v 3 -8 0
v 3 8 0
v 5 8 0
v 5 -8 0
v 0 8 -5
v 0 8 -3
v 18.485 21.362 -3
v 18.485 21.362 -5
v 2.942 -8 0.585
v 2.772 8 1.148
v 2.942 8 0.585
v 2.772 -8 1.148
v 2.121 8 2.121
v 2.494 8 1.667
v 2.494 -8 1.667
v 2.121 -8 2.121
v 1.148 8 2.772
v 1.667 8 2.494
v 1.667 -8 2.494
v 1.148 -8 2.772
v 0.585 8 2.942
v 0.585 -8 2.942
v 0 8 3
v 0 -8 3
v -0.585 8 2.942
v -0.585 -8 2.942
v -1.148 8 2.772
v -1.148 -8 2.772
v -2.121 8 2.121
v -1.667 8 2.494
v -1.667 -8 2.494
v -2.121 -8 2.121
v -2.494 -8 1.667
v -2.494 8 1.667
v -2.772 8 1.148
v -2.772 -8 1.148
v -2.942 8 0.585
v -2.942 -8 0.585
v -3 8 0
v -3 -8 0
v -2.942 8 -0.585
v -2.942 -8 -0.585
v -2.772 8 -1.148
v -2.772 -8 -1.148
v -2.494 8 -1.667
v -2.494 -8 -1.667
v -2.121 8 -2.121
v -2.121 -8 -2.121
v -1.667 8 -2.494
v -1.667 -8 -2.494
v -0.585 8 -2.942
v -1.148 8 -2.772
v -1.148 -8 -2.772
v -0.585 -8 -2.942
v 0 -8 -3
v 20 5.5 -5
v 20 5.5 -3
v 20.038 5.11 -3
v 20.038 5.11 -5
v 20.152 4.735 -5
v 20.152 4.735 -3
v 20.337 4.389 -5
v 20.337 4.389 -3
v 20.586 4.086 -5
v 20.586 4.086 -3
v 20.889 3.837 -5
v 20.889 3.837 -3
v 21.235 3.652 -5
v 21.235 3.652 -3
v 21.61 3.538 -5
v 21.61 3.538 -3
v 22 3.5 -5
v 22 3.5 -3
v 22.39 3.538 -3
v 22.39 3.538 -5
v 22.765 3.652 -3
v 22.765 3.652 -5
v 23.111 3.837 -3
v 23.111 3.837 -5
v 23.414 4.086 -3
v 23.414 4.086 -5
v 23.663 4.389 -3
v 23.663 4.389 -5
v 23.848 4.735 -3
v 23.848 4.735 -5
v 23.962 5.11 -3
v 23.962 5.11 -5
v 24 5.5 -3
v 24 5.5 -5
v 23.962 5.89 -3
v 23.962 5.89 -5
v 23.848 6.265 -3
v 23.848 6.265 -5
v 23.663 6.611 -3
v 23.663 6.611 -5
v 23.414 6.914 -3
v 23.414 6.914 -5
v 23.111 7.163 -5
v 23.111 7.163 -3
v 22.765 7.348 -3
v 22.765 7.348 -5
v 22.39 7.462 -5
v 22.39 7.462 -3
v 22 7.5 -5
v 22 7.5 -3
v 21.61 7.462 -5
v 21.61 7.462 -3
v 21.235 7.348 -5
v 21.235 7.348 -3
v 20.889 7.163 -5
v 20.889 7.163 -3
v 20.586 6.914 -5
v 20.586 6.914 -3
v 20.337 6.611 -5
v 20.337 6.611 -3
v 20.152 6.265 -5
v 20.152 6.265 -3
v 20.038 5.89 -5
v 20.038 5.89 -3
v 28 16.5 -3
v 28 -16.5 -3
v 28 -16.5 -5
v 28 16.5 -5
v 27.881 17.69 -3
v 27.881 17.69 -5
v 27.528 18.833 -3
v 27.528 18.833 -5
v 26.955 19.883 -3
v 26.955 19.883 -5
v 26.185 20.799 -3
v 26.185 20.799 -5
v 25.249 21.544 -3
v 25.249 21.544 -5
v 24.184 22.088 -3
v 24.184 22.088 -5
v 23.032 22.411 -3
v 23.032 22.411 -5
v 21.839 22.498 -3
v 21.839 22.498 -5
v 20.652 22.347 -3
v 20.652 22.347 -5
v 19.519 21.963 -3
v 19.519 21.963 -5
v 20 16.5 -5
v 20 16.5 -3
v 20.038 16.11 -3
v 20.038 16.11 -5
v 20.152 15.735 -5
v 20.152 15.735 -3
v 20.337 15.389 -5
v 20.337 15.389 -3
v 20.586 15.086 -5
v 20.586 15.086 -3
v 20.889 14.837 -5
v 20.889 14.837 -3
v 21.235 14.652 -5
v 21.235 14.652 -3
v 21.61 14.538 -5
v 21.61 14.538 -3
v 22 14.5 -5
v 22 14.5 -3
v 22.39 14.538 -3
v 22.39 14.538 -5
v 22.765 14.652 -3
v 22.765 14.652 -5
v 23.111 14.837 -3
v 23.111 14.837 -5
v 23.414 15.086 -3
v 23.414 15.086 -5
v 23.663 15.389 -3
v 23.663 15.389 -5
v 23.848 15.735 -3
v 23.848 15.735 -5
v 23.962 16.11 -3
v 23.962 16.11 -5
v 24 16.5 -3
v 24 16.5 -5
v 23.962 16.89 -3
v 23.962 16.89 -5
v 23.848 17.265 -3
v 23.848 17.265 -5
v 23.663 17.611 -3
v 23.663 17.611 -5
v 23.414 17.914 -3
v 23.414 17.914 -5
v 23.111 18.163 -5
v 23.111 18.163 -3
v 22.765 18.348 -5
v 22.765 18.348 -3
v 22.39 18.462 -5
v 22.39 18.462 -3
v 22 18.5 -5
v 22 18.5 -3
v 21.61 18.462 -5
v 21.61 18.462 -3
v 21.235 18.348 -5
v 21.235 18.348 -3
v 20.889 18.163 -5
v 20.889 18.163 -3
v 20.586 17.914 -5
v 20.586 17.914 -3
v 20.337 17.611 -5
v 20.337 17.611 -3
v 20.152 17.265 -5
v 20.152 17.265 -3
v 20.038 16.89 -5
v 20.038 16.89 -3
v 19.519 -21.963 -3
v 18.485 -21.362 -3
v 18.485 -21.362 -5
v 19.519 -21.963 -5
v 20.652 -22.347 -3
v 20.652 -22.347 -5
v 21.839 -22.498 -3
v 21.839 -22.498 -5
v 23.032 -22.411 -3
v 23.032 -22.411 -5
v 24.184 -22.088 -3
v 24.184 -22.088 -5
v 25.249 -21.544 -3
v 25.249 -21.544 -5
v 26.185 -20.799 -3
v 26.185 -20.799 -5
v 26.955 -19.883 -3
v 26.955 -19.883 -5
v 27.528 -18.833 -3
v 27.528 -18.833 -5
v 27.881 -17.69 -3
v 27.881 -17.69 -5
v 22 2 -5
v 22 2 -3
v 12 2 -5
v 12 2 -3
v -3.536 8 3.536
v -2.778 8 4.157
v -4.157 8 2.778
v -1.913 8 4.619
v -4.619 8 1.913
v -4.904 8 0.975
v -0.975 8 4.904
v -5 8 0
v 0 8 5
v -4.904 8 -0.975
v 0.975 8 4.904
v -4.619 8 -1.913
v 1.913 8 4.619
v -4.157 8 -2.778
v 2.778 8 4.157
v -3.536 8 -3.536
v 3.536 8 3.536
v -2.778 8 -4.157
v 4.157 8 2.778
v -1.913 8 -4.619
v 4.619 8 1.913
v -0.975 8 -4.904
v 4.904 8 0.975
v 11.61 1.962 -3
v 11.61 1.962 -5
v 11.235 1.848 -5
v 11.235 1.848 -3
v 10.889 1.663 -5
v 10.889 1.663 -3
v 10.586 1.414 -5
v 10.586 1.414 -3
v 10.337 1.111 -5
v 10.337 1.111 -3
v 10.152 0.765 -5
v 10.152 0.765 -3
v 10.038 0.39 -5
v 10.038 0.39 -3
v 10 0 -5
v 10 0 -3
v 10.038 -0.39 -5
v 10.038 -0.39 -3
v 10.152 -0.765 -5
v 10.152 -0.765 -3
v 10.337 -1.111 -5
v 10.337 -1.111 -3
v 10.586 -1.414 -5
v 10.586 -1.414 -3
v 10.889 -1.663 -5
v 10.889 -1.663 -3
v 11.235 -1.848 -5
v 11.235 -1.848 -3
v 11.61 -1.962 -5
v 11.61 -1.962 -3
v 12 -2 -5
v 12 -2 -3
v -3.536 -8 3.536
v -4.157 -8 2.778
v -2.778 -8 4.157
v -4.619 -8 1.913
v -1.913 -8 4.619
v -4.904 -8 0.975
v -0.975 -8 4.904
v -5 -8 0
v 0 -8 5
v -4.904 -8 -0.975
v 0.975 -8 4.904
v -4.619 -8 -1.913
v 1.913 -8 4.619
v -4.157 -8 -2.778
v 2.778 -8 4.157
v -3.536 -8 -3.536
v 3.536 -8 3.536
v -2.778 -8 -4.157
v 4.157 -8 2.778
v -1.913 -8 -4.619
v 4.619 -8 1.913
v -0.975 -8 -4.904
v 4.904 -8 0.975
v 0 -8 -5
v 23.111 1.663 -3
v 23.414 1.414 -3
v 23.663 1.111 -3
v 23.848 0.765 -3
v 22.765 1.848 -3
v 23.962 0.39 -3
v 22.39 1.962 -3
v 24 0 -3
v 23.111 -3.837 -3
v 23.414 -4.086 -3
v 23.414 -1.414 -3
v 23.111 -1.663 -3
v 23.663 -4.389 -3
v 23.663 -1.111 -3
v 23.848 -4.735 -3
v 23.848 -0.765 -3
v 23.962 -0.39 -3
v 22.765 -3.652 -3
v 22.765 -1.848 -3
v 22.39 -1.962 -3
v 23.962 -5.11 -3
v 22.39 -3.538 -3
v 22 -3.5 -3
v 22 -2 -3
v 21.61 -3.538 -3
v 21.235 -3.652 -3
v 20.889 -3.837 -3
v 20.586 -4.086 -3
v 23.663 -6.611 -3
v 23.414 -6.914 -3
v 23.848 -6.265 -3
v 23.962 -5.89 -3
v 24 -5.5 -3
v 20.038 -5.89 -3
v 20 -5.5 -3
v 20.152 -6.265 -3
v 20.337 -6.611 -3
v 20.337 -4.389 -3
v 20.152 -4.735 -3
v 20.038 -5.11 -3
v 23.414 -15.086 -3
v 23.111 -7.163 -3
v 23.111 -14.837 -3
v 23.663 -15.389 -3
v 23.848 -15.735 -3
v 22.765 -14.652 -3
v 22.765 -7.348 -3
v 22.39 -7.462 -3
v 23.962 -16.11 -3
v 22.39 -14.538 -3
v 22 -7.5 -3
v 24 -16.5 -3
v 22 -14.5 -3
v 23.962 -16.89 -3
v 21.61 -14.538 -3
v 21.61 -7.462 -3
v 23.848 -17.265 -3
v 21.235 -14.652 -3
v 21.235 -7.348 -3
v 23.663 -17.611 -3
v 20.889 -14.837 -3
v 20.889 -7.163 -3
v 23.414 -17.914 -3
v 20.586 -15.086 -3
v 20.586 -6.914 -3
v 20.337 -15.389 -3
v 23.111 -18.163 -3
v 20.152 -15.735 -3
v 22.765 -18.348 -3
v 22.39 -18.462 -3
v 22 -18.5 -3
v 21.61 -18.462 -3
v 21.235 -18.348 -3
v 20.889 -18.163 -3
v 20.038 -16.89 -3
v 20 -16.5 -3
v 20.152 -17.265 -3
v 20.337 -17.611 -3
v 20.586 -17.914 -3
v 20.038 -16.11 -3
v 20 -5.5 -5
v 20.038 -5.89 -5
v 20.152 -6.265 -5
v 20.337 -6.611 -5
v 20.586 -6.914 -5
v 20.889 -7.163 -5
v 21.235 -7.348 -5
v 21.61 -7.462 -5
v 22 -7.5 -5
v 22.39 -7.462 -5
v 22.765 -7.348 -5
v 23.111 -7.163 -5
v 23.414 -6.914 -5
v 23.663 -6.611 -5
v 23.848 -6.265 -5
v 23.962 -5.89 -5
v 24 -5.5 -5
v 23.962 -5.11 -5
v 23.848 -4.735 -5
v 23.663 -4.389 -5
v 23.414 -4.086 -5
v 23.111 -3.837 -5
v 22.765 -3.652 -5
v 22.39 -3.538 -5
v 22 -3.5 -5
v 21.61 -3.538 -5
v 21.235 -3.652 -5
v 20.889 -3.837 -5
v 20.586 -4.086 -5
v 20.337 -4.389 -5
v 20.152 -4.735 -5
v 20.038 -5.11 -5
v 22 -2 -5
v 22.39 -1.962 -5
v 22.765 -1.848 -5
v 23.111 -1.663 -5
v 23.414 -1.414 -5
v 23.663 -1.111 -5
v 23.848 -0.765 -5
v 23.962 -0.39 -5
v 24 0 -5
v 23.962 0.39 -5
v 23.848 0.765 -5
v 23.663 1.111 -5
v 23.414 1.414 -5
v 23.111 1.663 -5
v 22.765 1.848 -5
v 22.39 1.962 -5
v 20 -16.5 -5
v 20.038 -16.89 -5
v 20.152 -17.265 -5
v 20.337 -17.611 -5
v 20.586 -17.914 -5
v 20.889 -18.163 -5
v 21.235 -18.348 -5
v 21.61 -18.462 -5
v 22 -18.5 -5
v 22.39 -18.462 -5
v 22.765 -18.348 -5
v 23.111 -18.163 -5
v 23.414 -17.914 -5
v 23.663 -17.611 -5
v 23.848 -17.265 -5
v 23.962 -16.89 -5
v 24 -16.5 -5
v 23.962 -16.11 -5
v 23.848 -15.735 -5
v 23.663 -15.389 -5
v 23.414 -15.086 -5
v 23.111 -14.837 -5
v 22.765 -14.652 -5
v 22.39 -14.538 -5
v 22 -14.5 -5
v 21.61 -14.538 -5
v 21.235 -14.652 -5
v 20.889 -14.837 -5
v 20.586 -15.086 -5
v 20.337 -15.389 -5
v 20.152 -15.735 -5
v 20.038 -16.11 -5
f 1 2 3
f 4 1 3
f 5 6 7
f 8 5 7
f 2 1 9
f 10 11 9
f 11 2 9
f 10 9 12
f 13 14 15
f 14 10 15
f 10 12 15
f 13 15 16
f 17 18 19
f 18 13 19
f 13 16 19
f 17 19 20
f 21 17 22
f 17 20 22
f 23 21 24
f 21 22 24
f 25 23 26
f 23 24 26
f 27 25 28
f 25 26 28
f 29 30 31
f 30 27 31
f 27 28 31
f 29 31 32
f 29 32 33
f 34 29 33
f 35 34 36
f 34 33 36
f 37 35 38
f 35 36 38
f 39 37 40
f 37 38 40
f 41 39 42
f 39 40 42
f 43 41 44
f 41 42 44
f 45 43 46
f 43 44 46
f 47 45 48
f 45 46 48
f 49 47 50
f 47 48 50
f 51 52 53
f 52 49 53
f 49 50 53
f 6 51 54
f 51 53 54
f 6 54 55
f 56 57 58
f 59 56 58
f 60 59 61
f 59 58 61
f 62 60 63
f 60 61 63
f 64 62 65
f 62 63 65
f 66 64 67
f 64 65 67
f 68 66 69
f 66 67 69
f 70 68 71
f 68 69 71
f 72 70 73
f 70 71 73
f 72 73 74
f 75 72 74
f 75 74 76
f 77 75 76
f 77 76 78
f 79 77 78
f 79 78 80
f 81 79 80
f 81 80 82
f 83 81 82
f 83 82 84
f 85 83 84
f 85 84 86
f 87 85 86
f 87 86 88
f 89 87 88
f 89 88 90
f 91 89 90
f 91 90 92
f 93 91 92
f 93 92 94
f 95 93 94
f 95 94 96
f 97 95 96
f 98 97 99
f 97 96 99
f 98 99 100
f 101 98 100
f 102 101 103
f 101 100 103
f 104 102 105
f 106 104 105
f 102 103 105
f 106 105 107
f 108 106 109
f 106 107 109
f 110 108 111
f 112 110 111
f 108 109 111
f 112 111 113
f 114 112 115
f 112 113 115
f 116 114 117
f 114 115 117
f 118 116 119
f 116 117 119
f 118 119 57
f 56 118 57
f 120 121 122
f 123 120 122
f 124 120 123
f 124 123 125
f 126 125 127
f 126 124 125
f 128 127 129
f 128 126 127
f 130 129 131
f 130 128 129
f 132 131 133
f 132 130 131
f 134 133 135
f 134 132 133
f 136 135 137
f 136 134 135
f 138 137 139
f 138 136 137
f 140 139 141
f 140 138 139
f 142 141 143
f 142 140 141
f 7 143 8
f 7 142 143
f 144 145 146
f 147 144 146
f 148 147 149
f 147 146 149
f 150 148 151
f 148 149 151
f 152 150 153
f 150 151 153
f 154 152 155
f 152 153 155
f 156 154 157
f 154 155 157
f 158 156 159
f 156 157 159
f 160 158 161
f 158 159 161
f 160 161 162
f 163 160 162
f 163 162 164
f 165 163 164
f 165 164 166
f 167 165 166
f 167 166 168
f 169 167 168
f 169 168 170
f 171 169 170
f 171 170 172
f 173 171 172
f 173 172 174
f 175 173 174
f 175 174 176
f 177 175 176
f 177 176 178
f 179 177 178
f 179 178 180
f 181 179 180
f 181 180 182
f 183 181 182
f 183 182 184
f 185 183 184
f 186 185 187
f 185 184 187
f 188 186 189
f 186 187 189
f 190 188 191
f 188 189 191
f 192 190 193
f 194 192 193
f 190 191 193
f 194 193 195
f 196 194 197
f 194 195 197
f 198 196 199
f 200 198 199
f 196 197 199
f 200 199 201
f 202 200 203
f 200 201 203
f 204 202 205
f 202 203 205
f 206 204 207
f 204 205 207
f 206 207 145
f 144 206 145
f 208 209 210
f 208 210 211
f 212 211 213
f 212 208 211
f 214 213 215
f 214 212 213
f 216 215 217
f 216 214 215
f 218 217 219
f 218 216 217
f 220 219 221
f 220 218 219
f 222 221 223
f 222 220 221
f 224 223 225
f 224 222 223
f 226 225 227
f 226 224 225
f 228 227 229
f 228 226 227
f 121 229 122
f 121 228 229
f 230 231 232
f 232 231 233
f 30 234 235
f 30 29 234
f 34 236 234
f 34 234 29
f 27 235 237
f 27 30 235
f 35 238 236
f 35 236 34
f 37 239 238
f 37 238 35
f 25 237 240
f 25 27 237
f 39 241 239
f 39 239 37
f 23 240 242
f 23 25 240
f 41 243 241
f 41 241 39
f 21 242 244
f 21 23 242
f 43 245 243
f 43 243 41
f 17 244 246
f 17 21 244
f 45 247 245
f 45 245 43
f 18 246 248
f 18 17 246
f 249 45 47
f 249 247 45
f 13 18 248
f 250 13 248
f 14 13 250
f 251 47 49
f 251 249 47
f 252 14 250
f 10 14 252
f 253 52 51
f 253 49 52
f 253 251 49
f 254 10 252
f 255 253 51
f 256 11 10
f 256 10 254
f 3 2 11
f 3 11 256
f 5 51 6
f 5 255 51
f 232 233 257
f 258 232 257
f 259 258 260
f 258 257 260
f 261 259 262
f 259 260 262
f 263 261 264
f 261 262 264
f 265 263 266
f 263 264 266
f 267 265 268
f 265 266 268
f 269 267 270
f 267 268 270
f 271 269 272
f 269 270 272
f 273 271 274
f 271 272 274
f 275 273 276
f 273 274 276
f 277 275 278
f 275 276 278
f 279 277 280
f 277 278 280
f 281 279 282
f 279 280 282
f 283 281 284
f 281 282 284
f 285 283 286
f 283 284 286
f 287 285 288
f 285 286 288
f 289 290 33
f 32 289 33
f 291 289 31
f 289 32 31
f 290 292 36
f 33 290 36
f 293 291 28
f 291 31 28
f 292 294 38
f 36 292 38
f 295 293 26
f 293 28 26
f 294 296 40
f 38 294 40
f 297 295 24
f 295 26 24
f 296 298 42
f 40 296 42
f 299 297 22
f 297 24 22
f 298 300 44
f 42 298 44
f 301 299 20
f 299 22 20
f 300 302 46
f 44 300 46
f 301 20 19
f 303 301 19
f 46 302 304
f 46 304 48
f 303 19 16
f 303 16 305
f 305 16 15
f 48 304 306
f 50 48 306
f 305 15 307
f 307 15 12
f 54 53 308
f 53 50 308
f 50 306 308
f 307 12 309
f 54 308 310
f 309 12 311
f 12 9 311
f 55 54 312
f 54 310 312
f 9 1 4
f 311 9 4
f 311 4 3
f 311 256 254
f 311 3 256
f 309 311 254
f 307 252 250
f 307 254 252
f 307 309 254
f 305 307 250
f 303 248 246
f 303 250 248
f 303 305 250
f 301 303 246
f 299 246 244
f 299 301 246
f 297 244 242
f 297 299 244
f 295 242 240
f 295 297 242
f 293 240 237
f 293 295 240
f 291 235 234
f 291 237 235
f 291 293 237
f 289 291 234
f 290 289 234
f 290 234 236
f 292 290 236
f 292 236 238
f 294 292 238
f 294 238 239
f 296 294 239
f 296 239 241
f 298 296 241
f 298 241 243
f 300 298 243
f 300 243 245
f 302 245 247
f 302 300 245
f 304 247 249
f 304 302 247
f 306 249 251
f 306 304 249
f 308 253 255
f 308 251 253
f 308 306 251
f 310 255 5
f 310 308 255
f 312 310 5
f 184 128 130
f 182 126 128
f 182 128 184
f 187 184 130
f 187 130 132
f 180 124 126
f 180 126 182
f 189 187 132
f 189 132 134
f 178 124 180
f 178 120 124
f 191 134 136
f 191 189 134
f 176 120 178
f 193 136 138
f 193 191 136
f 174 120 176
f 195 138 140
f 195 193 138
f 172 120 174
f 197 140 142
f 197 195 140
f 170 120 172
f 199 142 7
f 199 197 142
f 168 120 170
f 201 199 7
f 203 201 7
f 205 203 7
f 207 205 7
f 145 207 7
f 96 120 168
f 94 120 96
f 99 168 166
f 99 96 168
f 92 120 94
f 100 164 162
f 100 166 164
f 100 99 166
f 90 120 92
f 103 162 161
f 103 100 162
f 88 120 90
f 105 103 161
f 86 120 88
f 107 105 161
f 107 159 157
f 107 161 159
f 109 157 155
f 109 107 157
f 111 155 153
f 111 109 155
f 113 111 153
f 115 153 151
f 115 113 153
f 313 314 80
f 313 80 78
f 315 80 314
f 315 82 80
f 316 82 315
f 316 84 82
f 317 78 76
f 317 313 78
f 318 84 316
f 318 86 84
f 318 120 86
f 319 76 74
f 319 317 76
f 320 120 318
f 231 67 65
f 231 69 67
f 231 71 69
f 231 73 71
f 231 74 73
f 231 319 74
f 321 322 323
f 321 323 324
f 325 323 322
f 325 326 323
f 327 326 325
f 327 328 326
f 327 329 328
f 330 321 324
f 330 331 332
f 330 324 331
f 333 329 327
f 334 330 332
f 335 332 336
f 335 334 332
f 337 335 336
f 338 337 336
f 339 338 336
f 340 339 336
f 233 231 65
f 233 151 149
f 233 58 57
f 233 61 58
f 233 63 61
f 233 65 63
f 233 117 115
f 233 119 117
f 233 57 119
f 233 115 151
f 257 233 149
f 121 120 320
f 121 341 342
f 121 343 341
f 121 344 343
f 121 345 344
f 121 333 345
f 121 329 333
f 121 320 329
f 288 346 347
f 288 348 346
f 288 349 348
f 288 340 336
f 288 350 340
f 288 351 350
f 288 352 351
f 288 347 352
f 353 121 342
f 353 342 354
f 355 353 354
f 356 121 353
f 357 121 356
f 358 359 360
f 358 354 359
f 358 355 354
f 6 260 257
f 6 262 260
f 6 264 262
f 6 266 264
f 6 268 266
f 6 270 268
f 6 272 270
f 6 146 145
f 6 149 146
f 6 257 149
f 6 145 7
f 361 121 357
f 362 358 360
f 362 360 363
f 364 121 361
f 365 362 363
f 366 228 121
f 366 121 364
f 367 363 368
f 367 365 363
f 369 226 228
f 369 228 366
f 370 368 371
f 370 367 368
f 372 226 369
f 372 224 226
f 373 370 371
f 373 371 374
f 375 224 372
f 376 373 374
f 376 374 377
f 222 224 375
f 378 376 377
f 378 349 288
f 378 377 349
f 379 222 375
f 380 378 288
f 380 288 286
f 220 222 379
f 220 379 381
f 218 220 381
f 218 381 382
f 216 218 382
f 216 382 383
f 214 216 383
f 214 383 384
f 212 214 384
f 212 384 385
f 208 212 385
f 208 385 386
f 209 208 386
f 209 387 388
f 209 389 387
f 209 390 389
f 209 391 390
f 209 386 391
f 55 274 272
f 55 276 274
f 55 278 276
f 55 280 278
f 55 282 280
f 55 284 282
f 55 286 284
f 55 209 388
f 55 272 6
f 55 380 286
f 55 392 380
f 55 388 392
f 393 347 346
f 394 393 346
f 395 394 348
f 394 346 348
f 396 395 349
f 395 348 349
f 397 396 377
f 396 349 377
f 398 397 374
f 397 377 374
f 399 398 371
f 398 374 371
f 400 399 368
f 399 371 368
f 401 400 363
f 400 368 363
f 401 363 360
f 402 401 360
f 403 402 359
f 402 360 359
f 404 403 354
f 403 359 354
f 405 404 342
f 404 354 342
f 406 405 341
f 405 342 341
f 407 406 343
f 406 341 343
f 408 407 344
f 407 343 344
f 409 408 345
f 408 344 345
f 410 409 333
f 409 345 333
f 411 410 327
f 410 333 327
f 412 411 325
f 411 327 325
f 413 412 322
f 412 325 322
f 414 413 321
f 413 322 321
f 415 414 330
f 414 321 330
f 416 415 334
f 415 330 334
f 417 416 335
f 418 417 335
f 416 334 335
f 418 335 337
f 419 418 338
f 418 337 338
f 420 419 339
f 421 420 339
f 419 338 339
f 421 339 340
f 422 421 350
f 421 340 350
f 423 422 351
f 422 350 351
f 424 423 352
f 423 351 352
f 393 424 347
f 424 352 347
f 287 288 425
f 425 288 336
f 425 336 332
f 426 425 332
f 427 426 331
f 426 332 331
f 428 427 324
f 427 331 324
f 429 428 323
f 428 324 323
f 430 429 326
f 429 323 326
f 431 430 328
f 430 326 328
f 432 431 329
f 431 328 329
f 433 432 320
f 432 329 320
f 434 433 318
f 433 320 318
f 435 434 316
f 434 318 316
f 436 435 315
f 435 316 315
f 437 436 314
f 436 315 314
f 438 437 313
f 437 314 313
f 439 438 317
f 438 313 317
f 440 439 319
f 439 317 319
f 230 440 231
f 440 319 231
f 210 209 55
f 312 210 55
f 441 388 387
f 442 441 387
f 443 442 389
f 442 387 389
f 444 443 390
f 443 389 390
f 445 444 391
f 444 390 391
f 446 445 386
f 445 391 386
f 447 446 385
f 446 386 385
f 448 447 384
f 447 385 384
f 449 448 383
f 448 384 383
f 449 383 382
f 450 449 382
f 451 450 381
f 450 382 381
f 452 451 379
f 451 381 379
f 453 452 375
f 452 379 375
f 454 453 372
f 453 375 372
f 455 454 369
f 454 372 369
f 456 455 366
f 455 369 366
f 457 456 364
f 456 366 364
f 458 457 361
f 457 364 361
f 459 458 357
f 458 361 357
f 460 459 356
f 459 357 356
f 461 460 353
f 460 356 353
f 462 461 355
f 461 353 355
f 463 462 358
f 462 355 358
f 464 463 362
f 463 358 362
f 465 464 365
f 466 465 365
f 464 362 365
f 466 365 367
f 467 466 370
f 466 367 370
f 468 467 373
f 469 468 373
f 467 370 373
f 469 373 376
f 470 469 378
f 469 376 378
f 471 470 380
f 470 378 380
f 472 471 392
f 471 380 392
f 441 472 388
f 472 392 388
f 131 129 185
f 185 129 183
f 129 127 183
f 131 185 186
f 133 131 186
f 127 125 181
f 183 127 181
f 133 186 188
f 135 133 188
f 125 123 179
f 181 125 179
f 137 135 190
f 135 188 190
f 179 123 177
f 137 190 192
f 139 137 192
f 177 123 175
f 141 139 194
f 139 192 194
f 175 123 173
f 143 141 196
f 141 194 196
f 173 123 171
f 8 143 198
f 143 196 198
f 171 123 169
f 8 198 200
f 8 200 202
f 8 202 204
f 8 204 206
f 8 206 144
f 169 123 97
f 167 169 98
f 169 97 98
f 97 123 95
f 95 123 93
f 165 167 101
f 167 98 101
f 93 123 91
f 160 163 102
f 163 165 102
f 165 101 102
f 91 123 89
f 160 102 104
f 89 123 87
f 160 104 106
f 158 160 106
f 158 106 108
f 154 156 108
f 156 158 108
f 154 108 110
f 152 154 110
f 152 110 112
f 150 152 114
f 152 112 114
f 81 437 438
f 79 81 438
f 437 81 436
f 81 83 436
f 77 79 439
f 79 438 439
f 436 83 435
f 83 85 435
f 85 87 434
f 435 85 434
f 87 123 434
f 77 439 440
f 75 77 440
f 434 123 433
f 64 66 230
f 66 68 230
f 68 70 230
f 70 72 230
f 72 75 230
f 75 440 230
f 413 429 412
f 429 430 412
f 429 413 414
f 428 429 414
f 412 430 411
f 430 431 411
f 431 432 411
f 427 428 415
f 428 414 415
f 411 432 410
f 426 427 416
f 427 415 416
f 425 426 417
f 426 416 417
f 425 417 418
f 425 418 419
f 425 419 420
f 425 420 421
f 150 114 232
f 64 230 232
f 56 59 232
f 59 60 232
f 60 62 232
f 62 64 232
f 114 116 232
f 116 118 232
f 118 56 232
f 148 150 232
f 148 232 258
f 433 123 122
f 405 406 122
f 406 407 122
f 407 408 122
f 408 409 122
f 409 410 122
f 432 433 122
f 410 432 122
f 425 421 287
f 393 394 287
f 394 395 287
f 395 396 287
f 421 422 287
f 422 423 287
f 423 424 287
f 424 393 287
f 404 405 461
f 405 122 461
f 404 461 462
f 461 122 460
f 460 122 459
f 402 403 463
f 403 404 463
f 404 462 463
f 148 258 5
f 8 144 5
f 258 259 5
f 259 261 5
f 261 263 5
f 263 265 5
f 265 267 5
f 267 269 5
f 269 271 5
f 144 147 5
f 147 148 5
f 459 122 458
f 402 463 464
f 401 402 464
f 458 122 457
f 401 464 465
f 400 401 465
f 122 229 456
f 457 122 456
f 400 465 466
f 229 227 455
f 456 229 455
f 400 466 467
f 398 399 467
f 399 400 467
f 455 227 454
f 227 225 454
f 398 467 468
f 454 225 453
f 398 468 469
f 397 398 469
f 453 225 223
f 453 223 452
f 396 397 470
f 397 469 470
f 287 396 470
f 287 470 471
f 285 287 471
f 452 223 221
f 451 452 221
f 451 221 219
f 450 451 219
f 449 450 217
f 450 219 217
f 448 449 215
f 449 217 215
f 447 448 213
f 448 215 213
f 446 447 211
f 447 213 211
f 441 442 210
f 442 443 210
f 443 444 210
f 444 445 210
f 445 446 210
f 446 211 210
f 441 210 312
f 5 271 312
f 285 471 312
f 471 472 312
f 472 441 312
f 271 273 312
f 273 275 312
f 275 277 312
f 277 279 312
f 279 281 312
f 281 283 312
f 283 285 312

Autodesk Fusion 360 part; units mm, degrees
sketch "草图1" plane through (0, 0, 0) normal (0, 1, 0) x (1, 0, 0)
  line L0 (28, 3) -> (28, 5)
  line L1 (28, 5) -> (0, 5)
  arc A0 (0, 5) -> (5, 0) centre (0, 0) ccw
  line L2 (28, 3) -> (0, 3)
  arc A1 (0, 3) -> (3, 0) centre (0, 0) ccw
  line L3 (3, 0) -> (5, 0)
  line L4 (0, 3) -> (0, 5)
  dimension "d1" = 2
  dimension "d2" = 3
  dimension "d3" = 5
  dimension "d4" = 2
  dimension "d5" = 28
extrude "拉伸1" add sketch "草图1" along normal mid plane 16 contours A0 A1 L3 L4
extrude "拉伸2" add sketch "草图1" along normal mid plane 45 contours L0 L1 L2 L4
sketch "草图2" plane through (0, 0, -3) normal (0, 0, 1) x (-1, 0, 0)
  line L0 (-28, 22.5) -> (-28, -22.5)
  line L1 (-28, -22.5) -> (0, -22.5)
  line L2 (0, -22.5) -> (0, -8)
  line L3 (0, -8) -> (0, 8)
  line L4 (0, 8) -> (0, 22.5)
  line L5 (0, 22.5) -> (-28, 22.5)
  line L6 (0, -8) -> (-18.4849, -21.3625)
  arc A0 (-28, -16.5) -> (-18.4849, -21.3625) centre (-22, -16.5) ccw
  line L7 (-28, -16.5) -> (-28, 16.5)
  arc A1 (-18.4849, 21.3625) -> (-28, 16.5) centre (-22, 16.5) ccw
  line L8 (-18.4849, 21.3625) -> (0, 8)
  line L9 (0, 8) -> (0, -8)
  line L10 (10, 0) -> (-55, 0) construction
  circle A2 centre (-22, -16.5) radius 2
  circle A3 centre (-22, 16.5) radius 2
  line L11 (-22, -16.5) -> (-22, 16.5) construction
  circle A4 centre (-22, -5.5) radius 2
  circle A5 centre (-22, 5.5) radius 2
  circle A6 centre (-22, 16.5) radius 2
  line L12 (-12, 2) -> (-22, 2)
  arc A7 (-22, 2) -> (-22, -2) centre (-22, 0) ccw
  line L13 (-22, -2) -> (-12, -2)
  arc A8 (-12, -2) -> (-12, 2) centre (-12, 0) ccw
  dimension "d10" = 6
  dimension "d11" = 6
  dimension "d12" = 45
  dimension "d13" = 4
  dimension "d14" = 4
  dimension "d17" = 33
  dimension "d18" = 0
  dimension "d19" = 4
  dimension "d20" = 14
extrude "拉伸3" cut sketch "草图2" against normal blind 11 contours L0 L5 A1 | L4 L5 A1 L8 | L0 L1 A0 | L1 L2 L6 A0 | A2 | A3 A6 | A4 | A5 | L12 A7 L13 A8
